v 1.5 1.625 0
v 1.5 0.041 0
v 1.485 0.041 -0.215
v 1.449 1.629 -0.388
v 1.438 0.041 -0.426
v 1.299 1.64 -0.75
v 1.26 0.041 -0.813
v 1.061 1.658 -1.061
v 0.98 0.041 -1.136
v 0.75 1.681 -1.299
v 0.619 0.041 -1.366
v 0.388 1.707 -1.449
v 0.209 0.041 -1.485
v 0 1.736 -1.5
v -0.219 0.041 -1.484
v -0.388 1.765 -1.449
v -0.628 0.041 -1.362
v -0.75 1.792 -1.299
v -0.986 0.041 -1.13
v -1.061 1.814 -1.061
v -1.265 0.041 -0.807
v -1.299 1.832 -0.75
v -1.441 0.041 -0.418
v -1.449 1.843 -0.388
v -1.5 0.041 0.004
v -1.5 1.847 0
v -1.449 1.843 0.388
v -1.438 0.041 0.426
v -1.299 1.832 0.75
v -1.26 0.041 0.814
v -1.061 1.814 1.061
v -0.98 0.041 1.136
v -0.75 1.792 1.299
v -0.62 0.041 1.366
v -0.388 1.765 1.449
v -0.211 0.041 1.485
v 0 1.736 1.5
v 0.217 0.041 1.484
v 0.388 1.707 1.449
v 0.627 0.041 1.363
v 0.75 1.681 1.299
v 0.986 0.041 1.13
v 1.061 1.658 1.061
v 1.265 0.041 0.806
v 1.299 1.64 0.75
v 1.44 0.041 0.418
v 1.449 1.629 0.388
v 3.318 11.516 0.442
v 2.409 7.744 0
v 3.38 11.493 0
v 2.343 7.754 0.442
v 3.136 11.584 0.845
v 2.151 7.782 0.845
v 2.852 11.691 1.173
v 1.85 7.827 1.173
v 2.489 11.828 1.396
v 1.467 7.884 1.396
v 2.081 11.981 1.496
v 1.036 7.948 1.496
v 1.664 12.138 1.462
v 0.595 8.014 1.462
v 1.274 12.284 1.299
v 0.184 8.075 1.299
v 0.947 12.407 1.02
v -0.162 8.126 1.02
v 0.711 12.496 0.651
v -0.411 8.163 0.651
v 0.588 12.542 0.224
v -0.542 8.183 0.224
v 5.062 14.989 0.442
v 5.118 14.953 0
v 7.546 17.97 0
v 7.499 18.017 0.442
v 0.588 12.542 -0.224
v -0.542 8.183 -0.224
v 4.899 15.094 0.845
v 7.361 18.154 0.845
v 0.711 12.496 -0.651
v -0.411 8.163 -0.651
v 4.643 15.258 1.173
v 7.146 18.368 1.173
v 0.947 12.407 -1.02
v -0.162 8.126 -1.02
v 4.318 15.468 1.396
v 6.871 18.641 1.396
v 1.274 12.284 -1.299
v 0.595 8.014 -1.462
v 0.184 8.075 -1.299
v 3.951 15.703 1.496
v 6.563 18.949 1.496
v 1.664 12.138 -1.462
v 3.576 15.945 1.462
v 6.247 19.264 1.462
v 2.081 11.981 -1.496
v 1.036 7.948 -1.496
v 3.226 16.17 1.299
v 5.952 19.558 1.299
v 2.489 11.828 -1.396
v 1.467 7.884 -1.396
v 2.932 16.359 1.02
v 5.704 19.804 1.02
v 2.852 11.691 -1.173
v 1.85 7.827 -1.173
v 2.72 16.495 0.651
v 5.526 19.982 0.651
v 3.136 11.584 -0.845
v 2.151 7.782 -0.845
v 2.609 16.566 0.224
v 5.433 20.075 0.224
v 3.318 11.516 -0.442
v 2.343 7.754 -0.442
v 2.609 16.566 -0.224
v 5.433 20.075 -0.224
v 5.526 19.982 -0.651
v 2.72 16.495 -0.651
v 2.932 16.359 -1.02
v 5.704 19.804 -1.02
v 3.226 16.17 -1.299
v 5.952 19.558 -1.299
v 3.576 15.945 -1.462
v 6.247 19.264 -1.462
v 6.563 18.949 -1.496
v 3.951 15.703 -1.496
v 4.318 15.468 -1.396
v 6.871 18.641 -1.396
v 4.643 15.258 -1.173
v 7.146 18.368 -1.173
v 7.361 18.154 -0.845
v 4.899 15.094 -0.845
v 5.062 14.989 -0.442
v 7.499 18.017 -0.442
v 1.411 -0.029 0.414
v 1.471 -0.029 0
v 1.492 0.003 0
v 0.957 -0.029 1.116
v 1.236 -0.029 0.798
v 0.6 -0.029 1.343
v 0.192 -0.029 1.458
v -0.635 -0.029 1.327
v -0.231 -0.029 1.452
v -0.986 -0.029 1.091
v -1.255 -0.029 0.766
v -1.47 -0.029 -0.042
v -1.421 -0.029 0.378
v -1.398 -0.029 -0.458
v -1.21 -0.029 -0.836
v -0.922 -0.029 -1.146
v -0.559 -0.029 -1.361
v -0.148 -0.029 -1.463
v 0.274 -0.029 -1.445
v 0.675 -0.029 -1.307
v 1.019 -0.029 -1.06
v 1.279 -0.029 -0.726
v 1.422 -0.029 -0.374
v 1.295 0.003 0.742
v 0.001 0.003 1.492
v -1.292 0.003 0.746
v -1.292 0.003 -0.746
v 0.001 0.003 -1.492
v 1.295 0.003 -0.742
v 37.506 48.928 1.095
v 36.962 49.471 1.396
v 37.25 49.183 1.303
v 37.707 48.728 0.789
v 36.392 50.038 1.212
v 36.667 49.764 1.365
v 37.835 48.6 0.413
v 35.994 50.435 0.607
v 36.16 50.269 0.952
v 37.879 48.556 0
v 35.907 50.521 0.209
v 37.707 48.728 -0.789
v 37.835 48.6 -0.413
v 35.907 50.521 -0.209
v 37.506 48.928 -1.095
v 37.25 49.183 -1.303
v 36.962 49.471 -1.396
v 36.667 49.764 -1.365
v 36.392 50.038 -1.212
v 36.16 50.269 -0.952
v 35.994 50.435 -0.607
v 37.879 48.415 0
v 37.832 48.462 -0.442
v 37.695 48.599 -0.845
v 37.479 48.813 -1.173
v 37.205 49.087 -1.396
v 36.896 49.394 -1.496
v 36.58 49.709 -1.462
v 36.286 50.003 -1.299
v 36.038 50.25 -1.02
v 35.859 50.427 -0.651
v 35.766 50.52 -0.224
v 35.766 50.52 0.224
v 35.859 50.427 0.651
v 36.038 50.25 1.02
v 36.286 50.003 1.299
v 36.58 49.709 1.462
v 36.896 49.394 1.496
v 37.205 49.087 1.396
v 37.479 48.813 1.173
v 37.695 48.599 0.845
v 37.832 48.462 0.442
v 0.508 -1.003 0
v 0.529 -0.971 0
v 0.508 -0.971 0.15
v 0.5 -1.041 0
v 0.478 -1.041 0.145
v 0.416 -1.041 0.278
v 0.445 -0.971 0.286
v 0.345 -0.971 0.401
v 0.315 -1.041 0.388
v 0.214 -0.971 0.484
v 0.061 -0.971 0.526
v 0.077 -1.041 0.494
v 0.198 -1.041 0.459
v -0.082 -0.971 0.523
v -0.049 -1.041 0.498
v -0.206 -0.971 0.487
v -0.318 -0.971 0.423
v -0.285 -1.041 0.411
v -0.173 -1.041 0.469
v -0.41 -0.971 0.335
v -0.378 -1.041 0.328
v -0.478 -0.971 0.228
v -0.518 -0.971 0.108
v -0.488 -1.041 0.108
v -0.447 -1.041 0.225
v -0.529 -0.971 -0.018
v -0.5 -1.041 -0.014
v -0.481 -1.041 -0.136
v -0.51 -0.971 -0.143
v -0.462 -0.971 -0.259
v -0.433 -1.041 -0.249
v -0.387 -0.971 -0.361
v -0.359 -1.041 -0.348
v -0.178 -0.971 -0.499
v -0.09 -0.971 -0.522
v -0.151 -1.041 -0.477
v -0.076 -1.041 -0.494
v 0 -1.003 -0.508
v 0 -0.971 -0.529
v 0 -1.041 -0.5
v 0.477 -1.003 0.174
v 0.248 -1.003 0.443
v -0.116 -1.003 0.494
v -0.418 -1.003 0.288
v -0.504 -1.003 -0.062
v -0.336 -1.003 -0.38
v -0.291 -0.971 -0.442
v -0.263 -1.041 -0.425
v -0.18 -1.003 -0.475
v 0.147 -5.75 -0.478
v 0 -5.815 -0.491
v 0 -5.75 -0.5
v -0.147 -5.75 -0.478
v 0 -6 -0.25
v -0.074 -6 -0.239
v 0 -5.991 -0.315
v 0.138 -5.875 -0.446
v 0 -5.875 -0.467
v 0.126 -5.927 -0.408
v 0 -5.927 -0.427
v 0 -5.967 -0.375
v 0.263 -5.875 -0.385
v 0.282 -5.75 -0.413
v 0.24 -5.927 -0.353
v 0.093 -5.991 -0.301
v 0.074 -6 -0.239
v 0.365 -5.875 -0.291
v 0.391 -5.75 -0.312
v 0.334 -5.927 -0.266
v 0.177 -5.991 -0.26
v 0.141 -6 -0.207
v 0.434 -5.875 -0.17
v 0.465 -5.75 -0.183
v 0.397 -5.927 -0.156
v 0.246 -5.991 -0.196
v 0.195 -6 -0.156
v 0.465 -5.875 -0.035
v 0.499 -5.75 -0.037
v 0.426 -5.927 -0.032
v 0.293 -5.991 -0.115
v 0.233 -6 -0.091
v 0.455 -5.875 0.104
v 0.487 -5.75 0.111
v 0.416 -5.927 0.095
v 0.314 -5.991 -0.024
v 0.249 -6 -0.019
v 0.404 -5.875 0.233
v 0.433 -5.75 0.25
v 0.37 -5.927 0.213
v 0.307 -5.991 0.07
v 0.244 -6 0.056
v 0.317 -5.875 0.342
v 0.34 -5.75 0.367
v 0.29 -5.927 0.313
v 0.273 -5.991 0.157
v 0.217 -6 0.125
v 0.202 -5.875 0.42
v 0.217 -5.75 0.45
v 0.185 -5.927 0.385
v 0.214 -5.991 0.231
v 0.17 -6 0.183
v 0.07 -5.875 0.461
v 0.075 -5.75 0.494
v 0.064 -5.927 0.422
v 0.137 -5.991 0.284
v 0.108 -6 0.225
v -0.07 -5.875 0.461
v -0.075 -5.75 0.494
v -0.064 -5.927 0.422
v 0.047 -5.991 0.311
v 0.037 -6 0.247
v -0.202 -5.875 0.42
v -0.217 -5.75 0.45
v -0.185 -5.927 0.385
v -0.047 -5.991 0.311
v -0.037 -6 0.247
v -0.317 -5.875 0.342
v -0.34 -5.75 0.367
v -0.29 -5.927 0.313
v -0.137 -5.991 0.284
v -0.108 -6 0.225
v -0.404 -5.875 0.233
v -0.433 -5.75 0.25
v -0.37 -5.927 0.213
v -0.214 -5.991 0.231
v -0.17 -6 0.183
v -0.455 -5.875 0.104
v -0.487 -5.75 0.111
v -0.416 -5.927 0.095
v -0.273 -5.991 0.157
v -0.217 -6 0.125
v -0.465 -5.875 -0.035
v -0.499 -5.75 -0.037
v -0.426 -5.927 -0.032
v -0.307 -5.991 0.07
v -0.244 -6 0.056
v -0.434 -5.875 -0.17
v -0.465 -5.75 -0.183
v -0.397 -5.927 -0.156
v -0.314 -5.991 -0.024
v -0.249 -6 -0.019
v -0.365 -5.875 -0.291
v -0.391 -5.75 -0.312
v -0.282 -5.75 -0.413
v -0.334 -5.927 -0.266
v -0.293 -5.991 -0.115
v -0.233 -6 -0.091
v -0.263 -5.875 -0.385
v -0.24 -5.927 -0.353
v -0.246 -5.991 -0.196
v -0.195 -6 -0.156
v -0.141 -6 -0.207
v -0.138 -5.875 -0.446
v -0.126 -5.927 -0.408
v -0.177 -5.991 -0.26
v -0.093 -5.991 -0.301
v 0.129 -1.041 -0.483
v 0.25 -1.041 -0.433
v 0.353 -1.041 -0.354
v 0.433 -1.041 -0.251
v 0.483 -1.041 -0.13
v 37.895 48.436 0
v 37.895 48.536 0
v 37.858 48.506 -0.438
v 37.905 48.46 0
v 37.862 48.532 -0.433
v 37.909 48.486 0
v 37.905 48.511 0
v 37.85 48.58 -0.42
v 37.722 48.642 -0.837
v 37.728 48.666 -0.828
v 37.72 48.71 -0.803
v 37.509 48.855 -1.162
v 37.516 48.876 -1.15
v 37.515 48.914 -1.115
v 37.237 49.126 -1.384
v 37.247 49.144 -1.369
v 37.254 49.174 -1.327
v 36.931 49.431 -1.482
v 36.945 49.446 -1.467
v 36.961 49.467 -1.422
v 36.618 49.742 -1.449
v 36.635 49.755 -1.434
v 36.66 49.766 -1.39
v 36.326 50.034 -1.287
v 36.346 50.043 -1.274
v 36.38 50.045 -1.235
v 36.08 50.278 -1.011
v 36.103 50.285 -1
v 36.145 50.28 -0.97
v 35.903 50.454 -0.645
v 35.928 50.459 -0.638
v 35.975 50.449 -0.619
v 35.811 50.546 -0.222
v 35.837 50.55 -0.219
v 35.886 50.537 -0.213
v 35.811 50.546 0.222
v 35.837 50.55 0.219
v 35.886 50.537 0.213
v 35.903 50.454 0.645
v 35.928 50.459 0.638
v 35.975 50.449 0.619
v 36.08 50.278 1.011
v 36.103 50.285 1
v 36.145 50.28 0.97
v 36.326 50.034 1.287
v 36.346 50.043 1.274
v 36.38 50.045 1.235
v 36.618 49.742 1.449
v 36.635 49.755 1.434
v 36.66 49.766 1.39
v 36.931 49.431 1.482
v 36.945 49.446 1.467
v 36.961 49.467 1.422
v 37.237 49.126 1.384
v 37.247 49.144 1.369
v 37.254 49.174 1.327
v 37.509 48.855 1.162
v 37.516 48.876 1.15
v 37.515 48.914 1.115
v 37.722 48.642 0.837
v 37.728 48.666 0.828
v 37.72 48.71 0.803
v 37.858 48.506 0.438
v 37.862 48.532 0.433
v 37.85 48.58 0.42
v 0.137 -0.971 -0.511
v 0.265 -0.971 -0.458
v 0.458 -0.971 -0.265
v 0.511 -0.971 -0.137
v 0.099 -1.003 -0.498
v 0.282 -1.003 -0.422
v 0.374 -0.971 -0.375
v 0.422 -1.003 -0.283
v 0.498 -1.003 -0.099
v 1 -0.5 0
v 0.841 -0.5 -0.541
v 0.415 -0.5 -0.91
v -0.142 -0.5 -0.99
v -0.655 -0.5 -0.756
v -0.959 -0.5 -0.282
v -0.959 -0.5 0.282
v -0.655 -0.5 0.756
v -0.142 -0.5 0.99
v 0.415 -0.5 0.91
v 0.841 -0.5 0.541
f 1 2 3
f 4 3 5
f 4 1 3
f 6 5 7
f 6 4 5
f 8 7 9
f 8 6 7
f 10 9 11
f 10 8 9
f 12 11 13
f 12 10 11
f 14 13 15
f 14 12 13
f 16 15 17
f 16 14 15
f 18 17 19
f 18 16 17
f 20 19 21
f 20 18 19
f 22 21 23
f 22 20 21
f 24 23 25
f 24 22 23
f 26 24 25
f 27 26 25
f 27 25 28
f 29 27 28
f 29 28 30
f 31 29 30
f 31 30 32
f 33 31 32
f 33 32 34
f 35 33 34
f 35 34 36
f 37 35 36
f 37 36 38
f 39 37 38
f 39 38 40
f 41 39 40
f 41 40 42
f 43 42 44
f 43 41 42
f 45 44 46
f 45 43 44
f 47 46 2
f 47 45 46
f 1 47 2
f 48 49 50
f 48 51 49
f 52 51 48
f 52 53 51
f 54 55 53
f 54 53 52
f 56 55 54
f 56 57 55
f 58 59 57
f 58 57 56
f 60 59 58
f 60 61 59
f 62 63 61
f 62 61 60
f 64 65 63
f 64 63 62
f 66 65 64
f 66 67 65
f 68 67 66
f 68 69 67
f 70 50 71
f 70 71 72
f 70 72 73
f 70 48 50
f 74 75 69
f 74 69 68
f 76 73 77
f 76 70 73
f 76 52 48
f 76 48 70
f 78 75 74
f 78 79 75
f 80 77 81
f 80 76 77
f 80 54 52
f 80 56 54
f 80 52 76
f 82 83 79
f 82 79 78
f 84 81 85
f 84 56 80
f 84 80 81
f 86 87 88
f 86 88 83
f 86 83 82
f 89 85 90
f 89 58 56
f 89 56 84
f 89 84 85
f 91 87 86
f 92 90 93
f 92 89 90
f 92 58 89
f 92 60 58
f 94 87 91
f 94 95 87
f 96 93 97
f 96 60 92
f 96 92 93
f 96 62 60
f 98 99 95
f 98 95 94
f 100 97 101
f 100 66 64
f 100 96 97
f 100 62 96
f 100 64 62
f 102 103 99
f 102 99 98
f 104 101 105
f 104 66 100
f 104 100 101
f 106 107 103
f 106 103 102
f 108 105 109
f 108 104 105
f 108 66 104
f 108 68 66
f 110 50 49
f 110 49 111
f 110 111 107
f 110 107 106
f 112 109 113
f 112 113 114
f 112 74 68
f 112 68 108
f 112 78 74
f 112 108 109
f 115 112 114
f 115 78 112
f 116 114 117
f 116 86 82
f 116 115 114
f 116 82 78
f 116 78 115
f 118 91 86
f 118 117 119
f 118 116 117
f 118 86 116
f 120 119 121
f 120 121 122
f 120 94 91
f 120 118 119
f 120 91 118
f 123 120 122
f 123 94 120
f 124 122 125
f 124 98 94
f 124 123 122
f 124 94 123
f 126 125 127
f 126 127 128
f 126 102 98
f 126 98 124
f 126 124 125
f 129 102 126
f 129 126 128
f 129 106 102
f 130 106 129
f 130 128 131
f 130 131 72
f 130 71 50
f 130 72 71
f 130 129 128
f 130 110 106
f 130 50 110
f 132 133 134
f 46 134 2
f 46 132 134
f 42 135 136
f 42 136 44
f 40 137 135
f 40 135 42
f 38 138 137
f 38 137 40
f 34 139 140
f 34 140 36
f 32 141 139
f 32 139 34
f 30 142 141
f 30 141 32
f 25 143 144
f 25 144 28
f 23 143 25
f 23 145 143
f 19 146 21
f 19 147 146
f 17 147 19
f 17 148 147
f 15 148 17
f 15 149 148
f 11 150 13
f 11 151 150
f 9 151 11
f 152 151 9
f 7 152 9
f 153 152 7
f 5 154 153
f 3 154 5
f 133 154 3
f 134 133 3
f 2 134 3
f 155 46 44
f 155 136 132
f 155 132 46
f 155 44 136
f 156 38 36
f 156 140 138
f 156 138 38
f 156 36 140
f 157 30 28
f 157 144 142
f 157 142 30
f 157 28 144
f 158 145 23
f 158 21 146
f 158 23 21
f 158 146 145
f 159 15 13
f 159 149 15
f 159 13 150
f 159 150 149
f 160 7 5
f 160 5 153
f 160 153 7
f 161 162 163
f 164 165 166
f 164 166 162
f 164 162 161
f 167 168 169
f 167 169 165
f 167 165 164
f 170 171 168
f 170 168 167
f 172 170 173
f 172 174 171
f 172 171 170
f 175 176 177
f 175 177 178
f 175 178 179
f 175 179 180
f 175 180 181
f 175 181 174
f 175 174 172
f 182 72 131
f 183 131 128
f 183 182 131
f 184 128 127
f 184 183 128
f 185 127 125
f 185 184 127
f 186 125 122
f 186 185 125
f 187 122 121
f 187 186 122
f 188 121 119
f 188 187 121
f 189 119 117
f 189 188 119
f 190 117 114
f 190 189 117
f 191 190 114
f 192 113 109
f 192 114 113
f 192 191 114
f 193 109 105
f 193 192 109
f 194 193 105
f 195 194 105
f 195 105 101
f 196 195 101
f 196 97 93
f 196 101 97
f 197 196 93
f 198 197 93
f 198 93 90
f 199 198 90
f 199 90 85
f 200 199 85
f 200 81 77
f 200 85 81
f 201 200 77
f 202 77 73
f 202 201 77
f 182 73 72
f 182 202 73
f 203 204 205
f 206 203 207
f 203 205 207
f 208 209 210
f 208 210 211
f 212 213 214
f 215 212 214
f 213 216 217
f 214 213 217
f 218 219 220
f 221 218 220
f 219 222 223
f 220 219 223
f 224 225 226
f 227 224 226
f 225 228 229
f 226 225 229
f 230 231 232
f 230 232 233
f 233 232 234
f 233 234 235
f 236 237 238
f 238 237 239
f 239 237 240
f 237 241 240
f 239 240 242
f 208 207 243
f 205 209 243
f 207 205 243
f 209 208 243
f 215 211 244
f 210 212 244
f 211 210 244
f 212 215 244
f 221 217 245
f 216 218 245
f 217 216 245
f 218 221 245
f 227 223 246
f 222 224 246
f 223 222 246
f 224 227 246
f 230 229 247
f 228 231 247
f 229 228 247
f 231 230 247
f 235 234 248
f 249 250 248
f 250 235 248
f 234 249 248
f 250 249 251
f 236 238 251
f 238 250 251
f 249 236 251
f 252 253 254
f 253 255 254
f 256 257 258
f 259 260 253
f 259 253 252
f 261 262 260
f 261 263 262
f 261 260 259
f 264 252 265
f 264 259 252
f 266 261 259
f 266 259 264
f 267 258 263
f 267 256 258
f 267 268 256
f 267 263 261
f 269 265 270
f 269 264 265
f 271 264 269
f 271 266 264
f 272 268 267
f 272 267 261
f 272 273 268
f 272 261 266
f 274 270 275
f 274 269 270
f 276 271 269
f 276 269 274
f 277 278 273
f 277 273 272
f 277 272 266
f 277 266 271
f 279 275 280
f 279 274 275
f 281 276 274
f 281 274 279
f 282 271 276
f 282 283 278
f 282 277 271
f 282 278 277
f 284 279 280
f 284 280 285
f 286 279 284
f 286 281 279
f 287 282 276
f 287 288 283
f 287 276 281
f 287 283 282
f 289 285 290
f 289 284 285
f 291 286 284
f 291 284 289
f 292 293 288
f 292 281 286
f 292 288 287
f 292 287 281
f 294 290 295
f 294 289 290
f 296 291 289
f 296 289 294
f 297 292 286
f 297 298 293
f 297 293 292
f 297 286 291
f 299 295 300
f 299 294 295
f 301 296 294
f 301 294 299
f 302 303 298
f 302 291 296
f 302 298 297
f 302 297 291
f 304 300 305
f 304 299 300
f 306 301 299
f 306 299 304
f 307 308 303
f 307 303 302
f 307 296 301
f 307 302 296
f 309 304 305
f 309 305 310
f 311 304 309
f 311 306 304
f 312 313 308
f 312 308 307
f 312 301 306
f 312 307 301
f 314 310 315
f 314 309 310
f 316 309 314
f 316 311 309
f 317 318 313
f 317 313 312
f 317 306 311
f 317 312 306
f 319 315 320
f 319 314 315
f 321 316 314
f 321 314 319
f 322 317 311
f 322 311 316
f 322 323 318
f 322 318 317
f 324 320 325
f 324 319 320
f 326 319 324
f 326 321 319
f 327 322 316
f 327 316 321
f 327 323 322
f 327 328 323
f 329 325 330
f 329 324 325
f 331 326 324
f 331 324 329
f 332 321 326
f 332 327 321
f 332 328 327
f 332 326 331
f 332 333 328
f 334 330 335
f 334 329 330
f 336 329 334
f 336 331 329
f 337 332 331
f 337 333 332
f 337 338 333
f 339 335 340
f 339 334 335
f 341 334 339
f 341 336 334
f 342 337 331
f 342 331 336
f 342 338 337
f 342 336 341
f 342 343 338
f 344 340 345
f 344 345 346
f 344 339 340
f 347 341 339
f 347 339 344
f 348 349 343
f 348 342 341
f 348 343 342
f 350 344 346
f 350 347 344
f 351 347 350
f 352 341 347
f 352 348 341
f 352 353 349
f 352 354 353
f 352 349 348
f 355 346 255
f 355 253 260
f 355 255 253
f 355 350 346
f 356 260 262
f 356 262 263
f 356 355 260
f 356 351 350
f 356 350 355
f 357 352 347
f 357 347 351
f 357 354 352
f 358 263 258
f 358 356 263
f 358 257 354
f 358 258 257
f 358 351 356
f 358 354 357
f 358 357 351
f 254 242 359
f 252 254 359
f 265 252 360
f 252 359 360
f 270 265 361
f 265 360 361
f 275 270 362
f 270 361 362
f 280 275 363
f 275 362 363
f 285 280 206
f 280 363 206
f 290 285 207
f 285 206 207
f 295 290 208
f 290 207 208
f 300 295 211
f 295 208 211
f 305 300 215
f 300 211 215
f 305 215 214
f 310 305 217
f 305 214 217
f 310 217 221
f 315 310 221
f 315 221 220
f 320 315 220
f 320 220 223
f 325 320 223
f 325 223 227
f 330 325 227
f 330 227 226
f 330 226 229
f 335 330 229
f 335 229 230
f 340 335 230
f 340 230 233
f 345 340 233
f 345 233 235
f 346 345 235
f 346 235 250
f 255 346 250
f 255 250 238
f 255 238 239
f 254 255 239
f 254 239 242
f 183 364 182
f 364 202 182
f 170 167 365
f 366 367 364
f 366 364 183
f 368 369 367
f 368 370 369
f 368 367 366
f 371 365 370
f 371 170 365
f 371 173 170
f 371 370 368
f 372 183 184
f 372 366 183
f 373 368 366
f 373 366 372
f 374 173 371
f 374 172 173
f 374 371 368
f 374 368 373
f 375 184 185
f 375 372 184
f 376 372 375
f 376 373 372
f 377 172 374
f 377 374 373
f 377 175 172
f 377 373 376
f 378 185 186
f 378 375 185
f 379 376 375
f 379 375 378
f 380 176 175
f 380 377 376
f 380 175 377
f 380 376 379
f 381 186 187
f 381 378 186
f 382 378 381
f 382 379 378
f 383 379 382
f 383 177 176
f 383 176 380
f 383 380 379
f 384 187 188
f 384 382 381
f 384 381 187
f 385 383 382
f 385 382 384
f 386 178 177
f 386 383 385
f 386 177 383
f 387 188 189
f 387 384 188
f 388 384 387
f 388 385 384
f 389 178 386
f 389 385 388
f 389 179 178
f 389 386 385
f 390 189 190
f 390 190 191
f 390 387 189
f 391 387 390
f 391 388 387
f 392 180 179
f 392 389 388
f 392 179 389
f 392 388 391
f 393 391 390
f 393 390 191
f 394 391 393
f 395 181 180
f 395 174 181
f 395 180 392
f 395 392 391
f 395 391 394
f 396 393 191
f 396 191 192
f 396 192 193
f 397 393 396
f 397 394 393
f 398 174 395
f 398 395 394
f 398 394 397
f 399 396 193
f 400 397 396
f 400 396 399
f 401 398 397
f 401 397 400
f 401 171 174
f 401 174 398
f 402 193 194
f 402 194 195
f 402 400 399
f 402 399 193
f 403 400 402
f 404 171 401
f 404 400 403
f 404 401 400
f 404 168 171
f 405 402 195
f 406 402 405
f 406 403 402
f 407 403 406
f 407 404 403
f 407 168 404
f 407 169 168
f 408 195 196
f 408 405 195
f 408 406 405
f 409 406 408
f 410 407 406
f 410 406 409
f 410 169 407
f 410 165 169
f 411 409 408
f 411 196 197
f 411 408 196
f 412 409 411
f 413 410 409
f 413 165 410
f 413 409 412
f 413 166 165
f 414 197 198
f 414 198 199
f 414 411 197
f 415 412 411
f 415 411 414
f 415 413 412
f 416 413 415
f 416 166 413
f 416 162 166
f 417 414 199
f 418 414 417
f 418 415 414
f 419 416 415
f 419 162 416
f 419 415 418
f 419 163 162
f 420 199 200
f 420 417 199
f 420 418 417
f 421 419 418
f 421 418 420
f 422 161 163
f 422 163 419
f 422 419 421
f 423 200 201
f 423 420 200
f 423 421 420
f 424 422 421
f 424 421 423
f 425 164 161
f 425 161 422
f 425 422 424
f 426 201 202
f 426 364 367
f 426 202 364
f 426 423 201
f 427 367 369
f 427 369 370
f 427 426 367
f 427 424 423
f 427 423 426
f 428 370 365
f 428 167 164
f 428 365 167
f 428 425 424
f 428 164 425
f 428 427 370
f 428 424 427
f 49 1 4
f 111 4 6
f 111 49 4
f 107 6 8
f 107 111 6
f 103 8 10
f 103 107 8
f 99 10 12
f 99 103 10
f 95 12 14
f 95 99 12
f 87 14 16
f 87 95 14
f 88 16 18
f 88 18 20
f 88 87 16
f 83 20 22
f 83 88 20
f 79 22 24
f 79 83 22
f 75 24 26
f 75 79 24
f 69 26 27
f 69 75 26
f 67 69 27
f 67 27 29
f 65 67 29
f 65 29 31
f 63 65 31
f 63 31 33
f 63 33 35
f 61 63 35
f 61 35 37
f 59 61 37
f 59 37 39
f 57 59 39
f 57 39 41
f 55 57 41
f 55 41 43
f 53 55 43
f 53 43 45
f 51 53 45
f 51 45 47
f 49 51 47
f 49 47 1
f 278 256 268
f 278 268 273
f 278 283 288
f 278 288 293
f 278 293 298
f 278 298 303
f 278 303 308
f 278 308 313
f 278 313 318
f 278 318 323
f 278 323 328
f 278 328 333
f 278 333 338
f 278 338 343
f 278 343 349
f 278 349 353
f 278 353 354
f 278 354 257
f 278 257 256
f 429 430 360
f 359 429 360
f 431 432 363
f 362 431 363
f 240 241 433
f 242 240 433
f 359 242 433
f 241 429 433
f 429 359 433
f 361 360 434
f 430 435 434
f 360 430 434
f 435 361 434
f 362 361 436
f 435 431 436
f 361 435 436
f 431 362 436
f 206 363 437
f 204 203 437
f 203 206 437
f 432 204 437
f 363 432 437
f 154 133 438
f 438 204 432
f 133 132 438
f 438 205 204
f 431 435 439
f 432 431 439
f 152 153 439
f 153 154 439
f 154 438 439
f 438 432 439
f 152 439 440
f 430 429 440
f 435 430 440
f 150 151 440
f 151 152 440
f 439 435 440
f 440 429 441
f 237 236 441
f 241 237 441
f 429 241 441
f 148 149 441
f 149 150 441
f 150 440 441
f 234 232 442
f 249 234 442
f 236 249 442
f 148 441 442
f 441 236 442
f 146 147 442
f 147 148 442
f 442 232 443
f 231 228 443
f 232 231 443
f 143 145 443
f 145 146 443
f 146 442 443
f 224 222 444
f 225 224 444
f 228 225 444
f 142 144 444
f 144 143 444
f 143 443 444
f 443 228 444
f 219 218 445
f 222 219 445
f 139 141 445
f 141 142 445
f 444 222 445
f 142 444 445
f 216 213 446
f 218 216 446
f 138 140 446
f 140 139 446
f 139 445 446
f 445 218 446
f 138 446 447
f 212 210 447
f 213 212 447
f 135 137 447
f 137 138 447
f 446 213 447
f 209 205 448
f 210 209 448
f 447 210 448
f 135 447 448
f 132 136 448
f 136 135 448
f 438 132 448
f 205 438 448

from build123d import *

# Parameters (mm, degrees)
SKETCH1_R           = 1.5
SKETCH3_R           = 0.5
BOSS_EXTRUDE1_DEPTH = 5
FILLET3_R           = 0.25
FILLET4_R           = 0.1
FILLET5_R           = 0.1


with BuildPart() as part:
    # Sweep1: sweep along a path in Sketch2
    with BuildLine(Plane.XY) as sweep1_path:
        Line((0, 0), (0, 1.73610206))
        Line((0, 1.73610206), (0.925407967, 7.964634839))
        ThreePointArc((0.925407967, 7.964634839), (2.817194406, 13.942096973), (6.483252605, 19.028247459))
        Line((6.483252605, 19.028247459), (36.887428436, 49.54436271))
    # Sketch1 → Sweep1 (sweep)
    with BuildSketch(Plane(origin=(0, 0, 0), x_dir=(1, 0, 0), z_dir=(0, 1, 0))):
        Circle(SKETCH1_R)
    sweep(path=sweep1_path.line, transition=Transition.RIGHT)



with BuildPart() as body_2:
    # Sketch3 → Boss-Extrude1 (new body)
    with BuildSketch(Plane(origin=(0, -1, 0), x_dir=(-1, 0, 0), z_dir=(0, -1, 0))):
        with Locations(Location((0, 0, 0), (0, 0, 90))):
            Circle(SKETCH3_R)
    extrude(amount=BOSS_EXTRUDE1_DEPTH)


with BuildPart() as part_1:
    add(part.part)

    add(body_2.part)  # loft1 joins it to this body
    # loft from a face of the part (loft1)
    loft([part_1.faces().sort_by_distance((0, 0, 0))[0], part_1.faces().sort_by_distance((0, -1, 0))[0]])

    # Fillet3
    fillet3_edges = [part_1.edges().sort_by_distance(p)[0] for p in [
        (0, -6, 0.5),
    ]]
    fillet(fillet3_edges, radius=FILLET3_R)

    # Fillet4
    fillet4_edges = [part_1.edges().sort_by_distance(p)[0] for p in [
        (-1.5, 0, 0),
        (35.824821123, 50.603072159, 0),
    ]]
    fillet(fillet4_edges, radius=FILLET4_R)

    # Fillet5
    fillet5_edges = [part_1.edges().sort_by_distance(p)[0] for p in [
        (0.353553391, -1, -0.353553391),
    ]]
    fillet(fillet5_edges, radius=FILLET5_R)


solid = part_1.part
